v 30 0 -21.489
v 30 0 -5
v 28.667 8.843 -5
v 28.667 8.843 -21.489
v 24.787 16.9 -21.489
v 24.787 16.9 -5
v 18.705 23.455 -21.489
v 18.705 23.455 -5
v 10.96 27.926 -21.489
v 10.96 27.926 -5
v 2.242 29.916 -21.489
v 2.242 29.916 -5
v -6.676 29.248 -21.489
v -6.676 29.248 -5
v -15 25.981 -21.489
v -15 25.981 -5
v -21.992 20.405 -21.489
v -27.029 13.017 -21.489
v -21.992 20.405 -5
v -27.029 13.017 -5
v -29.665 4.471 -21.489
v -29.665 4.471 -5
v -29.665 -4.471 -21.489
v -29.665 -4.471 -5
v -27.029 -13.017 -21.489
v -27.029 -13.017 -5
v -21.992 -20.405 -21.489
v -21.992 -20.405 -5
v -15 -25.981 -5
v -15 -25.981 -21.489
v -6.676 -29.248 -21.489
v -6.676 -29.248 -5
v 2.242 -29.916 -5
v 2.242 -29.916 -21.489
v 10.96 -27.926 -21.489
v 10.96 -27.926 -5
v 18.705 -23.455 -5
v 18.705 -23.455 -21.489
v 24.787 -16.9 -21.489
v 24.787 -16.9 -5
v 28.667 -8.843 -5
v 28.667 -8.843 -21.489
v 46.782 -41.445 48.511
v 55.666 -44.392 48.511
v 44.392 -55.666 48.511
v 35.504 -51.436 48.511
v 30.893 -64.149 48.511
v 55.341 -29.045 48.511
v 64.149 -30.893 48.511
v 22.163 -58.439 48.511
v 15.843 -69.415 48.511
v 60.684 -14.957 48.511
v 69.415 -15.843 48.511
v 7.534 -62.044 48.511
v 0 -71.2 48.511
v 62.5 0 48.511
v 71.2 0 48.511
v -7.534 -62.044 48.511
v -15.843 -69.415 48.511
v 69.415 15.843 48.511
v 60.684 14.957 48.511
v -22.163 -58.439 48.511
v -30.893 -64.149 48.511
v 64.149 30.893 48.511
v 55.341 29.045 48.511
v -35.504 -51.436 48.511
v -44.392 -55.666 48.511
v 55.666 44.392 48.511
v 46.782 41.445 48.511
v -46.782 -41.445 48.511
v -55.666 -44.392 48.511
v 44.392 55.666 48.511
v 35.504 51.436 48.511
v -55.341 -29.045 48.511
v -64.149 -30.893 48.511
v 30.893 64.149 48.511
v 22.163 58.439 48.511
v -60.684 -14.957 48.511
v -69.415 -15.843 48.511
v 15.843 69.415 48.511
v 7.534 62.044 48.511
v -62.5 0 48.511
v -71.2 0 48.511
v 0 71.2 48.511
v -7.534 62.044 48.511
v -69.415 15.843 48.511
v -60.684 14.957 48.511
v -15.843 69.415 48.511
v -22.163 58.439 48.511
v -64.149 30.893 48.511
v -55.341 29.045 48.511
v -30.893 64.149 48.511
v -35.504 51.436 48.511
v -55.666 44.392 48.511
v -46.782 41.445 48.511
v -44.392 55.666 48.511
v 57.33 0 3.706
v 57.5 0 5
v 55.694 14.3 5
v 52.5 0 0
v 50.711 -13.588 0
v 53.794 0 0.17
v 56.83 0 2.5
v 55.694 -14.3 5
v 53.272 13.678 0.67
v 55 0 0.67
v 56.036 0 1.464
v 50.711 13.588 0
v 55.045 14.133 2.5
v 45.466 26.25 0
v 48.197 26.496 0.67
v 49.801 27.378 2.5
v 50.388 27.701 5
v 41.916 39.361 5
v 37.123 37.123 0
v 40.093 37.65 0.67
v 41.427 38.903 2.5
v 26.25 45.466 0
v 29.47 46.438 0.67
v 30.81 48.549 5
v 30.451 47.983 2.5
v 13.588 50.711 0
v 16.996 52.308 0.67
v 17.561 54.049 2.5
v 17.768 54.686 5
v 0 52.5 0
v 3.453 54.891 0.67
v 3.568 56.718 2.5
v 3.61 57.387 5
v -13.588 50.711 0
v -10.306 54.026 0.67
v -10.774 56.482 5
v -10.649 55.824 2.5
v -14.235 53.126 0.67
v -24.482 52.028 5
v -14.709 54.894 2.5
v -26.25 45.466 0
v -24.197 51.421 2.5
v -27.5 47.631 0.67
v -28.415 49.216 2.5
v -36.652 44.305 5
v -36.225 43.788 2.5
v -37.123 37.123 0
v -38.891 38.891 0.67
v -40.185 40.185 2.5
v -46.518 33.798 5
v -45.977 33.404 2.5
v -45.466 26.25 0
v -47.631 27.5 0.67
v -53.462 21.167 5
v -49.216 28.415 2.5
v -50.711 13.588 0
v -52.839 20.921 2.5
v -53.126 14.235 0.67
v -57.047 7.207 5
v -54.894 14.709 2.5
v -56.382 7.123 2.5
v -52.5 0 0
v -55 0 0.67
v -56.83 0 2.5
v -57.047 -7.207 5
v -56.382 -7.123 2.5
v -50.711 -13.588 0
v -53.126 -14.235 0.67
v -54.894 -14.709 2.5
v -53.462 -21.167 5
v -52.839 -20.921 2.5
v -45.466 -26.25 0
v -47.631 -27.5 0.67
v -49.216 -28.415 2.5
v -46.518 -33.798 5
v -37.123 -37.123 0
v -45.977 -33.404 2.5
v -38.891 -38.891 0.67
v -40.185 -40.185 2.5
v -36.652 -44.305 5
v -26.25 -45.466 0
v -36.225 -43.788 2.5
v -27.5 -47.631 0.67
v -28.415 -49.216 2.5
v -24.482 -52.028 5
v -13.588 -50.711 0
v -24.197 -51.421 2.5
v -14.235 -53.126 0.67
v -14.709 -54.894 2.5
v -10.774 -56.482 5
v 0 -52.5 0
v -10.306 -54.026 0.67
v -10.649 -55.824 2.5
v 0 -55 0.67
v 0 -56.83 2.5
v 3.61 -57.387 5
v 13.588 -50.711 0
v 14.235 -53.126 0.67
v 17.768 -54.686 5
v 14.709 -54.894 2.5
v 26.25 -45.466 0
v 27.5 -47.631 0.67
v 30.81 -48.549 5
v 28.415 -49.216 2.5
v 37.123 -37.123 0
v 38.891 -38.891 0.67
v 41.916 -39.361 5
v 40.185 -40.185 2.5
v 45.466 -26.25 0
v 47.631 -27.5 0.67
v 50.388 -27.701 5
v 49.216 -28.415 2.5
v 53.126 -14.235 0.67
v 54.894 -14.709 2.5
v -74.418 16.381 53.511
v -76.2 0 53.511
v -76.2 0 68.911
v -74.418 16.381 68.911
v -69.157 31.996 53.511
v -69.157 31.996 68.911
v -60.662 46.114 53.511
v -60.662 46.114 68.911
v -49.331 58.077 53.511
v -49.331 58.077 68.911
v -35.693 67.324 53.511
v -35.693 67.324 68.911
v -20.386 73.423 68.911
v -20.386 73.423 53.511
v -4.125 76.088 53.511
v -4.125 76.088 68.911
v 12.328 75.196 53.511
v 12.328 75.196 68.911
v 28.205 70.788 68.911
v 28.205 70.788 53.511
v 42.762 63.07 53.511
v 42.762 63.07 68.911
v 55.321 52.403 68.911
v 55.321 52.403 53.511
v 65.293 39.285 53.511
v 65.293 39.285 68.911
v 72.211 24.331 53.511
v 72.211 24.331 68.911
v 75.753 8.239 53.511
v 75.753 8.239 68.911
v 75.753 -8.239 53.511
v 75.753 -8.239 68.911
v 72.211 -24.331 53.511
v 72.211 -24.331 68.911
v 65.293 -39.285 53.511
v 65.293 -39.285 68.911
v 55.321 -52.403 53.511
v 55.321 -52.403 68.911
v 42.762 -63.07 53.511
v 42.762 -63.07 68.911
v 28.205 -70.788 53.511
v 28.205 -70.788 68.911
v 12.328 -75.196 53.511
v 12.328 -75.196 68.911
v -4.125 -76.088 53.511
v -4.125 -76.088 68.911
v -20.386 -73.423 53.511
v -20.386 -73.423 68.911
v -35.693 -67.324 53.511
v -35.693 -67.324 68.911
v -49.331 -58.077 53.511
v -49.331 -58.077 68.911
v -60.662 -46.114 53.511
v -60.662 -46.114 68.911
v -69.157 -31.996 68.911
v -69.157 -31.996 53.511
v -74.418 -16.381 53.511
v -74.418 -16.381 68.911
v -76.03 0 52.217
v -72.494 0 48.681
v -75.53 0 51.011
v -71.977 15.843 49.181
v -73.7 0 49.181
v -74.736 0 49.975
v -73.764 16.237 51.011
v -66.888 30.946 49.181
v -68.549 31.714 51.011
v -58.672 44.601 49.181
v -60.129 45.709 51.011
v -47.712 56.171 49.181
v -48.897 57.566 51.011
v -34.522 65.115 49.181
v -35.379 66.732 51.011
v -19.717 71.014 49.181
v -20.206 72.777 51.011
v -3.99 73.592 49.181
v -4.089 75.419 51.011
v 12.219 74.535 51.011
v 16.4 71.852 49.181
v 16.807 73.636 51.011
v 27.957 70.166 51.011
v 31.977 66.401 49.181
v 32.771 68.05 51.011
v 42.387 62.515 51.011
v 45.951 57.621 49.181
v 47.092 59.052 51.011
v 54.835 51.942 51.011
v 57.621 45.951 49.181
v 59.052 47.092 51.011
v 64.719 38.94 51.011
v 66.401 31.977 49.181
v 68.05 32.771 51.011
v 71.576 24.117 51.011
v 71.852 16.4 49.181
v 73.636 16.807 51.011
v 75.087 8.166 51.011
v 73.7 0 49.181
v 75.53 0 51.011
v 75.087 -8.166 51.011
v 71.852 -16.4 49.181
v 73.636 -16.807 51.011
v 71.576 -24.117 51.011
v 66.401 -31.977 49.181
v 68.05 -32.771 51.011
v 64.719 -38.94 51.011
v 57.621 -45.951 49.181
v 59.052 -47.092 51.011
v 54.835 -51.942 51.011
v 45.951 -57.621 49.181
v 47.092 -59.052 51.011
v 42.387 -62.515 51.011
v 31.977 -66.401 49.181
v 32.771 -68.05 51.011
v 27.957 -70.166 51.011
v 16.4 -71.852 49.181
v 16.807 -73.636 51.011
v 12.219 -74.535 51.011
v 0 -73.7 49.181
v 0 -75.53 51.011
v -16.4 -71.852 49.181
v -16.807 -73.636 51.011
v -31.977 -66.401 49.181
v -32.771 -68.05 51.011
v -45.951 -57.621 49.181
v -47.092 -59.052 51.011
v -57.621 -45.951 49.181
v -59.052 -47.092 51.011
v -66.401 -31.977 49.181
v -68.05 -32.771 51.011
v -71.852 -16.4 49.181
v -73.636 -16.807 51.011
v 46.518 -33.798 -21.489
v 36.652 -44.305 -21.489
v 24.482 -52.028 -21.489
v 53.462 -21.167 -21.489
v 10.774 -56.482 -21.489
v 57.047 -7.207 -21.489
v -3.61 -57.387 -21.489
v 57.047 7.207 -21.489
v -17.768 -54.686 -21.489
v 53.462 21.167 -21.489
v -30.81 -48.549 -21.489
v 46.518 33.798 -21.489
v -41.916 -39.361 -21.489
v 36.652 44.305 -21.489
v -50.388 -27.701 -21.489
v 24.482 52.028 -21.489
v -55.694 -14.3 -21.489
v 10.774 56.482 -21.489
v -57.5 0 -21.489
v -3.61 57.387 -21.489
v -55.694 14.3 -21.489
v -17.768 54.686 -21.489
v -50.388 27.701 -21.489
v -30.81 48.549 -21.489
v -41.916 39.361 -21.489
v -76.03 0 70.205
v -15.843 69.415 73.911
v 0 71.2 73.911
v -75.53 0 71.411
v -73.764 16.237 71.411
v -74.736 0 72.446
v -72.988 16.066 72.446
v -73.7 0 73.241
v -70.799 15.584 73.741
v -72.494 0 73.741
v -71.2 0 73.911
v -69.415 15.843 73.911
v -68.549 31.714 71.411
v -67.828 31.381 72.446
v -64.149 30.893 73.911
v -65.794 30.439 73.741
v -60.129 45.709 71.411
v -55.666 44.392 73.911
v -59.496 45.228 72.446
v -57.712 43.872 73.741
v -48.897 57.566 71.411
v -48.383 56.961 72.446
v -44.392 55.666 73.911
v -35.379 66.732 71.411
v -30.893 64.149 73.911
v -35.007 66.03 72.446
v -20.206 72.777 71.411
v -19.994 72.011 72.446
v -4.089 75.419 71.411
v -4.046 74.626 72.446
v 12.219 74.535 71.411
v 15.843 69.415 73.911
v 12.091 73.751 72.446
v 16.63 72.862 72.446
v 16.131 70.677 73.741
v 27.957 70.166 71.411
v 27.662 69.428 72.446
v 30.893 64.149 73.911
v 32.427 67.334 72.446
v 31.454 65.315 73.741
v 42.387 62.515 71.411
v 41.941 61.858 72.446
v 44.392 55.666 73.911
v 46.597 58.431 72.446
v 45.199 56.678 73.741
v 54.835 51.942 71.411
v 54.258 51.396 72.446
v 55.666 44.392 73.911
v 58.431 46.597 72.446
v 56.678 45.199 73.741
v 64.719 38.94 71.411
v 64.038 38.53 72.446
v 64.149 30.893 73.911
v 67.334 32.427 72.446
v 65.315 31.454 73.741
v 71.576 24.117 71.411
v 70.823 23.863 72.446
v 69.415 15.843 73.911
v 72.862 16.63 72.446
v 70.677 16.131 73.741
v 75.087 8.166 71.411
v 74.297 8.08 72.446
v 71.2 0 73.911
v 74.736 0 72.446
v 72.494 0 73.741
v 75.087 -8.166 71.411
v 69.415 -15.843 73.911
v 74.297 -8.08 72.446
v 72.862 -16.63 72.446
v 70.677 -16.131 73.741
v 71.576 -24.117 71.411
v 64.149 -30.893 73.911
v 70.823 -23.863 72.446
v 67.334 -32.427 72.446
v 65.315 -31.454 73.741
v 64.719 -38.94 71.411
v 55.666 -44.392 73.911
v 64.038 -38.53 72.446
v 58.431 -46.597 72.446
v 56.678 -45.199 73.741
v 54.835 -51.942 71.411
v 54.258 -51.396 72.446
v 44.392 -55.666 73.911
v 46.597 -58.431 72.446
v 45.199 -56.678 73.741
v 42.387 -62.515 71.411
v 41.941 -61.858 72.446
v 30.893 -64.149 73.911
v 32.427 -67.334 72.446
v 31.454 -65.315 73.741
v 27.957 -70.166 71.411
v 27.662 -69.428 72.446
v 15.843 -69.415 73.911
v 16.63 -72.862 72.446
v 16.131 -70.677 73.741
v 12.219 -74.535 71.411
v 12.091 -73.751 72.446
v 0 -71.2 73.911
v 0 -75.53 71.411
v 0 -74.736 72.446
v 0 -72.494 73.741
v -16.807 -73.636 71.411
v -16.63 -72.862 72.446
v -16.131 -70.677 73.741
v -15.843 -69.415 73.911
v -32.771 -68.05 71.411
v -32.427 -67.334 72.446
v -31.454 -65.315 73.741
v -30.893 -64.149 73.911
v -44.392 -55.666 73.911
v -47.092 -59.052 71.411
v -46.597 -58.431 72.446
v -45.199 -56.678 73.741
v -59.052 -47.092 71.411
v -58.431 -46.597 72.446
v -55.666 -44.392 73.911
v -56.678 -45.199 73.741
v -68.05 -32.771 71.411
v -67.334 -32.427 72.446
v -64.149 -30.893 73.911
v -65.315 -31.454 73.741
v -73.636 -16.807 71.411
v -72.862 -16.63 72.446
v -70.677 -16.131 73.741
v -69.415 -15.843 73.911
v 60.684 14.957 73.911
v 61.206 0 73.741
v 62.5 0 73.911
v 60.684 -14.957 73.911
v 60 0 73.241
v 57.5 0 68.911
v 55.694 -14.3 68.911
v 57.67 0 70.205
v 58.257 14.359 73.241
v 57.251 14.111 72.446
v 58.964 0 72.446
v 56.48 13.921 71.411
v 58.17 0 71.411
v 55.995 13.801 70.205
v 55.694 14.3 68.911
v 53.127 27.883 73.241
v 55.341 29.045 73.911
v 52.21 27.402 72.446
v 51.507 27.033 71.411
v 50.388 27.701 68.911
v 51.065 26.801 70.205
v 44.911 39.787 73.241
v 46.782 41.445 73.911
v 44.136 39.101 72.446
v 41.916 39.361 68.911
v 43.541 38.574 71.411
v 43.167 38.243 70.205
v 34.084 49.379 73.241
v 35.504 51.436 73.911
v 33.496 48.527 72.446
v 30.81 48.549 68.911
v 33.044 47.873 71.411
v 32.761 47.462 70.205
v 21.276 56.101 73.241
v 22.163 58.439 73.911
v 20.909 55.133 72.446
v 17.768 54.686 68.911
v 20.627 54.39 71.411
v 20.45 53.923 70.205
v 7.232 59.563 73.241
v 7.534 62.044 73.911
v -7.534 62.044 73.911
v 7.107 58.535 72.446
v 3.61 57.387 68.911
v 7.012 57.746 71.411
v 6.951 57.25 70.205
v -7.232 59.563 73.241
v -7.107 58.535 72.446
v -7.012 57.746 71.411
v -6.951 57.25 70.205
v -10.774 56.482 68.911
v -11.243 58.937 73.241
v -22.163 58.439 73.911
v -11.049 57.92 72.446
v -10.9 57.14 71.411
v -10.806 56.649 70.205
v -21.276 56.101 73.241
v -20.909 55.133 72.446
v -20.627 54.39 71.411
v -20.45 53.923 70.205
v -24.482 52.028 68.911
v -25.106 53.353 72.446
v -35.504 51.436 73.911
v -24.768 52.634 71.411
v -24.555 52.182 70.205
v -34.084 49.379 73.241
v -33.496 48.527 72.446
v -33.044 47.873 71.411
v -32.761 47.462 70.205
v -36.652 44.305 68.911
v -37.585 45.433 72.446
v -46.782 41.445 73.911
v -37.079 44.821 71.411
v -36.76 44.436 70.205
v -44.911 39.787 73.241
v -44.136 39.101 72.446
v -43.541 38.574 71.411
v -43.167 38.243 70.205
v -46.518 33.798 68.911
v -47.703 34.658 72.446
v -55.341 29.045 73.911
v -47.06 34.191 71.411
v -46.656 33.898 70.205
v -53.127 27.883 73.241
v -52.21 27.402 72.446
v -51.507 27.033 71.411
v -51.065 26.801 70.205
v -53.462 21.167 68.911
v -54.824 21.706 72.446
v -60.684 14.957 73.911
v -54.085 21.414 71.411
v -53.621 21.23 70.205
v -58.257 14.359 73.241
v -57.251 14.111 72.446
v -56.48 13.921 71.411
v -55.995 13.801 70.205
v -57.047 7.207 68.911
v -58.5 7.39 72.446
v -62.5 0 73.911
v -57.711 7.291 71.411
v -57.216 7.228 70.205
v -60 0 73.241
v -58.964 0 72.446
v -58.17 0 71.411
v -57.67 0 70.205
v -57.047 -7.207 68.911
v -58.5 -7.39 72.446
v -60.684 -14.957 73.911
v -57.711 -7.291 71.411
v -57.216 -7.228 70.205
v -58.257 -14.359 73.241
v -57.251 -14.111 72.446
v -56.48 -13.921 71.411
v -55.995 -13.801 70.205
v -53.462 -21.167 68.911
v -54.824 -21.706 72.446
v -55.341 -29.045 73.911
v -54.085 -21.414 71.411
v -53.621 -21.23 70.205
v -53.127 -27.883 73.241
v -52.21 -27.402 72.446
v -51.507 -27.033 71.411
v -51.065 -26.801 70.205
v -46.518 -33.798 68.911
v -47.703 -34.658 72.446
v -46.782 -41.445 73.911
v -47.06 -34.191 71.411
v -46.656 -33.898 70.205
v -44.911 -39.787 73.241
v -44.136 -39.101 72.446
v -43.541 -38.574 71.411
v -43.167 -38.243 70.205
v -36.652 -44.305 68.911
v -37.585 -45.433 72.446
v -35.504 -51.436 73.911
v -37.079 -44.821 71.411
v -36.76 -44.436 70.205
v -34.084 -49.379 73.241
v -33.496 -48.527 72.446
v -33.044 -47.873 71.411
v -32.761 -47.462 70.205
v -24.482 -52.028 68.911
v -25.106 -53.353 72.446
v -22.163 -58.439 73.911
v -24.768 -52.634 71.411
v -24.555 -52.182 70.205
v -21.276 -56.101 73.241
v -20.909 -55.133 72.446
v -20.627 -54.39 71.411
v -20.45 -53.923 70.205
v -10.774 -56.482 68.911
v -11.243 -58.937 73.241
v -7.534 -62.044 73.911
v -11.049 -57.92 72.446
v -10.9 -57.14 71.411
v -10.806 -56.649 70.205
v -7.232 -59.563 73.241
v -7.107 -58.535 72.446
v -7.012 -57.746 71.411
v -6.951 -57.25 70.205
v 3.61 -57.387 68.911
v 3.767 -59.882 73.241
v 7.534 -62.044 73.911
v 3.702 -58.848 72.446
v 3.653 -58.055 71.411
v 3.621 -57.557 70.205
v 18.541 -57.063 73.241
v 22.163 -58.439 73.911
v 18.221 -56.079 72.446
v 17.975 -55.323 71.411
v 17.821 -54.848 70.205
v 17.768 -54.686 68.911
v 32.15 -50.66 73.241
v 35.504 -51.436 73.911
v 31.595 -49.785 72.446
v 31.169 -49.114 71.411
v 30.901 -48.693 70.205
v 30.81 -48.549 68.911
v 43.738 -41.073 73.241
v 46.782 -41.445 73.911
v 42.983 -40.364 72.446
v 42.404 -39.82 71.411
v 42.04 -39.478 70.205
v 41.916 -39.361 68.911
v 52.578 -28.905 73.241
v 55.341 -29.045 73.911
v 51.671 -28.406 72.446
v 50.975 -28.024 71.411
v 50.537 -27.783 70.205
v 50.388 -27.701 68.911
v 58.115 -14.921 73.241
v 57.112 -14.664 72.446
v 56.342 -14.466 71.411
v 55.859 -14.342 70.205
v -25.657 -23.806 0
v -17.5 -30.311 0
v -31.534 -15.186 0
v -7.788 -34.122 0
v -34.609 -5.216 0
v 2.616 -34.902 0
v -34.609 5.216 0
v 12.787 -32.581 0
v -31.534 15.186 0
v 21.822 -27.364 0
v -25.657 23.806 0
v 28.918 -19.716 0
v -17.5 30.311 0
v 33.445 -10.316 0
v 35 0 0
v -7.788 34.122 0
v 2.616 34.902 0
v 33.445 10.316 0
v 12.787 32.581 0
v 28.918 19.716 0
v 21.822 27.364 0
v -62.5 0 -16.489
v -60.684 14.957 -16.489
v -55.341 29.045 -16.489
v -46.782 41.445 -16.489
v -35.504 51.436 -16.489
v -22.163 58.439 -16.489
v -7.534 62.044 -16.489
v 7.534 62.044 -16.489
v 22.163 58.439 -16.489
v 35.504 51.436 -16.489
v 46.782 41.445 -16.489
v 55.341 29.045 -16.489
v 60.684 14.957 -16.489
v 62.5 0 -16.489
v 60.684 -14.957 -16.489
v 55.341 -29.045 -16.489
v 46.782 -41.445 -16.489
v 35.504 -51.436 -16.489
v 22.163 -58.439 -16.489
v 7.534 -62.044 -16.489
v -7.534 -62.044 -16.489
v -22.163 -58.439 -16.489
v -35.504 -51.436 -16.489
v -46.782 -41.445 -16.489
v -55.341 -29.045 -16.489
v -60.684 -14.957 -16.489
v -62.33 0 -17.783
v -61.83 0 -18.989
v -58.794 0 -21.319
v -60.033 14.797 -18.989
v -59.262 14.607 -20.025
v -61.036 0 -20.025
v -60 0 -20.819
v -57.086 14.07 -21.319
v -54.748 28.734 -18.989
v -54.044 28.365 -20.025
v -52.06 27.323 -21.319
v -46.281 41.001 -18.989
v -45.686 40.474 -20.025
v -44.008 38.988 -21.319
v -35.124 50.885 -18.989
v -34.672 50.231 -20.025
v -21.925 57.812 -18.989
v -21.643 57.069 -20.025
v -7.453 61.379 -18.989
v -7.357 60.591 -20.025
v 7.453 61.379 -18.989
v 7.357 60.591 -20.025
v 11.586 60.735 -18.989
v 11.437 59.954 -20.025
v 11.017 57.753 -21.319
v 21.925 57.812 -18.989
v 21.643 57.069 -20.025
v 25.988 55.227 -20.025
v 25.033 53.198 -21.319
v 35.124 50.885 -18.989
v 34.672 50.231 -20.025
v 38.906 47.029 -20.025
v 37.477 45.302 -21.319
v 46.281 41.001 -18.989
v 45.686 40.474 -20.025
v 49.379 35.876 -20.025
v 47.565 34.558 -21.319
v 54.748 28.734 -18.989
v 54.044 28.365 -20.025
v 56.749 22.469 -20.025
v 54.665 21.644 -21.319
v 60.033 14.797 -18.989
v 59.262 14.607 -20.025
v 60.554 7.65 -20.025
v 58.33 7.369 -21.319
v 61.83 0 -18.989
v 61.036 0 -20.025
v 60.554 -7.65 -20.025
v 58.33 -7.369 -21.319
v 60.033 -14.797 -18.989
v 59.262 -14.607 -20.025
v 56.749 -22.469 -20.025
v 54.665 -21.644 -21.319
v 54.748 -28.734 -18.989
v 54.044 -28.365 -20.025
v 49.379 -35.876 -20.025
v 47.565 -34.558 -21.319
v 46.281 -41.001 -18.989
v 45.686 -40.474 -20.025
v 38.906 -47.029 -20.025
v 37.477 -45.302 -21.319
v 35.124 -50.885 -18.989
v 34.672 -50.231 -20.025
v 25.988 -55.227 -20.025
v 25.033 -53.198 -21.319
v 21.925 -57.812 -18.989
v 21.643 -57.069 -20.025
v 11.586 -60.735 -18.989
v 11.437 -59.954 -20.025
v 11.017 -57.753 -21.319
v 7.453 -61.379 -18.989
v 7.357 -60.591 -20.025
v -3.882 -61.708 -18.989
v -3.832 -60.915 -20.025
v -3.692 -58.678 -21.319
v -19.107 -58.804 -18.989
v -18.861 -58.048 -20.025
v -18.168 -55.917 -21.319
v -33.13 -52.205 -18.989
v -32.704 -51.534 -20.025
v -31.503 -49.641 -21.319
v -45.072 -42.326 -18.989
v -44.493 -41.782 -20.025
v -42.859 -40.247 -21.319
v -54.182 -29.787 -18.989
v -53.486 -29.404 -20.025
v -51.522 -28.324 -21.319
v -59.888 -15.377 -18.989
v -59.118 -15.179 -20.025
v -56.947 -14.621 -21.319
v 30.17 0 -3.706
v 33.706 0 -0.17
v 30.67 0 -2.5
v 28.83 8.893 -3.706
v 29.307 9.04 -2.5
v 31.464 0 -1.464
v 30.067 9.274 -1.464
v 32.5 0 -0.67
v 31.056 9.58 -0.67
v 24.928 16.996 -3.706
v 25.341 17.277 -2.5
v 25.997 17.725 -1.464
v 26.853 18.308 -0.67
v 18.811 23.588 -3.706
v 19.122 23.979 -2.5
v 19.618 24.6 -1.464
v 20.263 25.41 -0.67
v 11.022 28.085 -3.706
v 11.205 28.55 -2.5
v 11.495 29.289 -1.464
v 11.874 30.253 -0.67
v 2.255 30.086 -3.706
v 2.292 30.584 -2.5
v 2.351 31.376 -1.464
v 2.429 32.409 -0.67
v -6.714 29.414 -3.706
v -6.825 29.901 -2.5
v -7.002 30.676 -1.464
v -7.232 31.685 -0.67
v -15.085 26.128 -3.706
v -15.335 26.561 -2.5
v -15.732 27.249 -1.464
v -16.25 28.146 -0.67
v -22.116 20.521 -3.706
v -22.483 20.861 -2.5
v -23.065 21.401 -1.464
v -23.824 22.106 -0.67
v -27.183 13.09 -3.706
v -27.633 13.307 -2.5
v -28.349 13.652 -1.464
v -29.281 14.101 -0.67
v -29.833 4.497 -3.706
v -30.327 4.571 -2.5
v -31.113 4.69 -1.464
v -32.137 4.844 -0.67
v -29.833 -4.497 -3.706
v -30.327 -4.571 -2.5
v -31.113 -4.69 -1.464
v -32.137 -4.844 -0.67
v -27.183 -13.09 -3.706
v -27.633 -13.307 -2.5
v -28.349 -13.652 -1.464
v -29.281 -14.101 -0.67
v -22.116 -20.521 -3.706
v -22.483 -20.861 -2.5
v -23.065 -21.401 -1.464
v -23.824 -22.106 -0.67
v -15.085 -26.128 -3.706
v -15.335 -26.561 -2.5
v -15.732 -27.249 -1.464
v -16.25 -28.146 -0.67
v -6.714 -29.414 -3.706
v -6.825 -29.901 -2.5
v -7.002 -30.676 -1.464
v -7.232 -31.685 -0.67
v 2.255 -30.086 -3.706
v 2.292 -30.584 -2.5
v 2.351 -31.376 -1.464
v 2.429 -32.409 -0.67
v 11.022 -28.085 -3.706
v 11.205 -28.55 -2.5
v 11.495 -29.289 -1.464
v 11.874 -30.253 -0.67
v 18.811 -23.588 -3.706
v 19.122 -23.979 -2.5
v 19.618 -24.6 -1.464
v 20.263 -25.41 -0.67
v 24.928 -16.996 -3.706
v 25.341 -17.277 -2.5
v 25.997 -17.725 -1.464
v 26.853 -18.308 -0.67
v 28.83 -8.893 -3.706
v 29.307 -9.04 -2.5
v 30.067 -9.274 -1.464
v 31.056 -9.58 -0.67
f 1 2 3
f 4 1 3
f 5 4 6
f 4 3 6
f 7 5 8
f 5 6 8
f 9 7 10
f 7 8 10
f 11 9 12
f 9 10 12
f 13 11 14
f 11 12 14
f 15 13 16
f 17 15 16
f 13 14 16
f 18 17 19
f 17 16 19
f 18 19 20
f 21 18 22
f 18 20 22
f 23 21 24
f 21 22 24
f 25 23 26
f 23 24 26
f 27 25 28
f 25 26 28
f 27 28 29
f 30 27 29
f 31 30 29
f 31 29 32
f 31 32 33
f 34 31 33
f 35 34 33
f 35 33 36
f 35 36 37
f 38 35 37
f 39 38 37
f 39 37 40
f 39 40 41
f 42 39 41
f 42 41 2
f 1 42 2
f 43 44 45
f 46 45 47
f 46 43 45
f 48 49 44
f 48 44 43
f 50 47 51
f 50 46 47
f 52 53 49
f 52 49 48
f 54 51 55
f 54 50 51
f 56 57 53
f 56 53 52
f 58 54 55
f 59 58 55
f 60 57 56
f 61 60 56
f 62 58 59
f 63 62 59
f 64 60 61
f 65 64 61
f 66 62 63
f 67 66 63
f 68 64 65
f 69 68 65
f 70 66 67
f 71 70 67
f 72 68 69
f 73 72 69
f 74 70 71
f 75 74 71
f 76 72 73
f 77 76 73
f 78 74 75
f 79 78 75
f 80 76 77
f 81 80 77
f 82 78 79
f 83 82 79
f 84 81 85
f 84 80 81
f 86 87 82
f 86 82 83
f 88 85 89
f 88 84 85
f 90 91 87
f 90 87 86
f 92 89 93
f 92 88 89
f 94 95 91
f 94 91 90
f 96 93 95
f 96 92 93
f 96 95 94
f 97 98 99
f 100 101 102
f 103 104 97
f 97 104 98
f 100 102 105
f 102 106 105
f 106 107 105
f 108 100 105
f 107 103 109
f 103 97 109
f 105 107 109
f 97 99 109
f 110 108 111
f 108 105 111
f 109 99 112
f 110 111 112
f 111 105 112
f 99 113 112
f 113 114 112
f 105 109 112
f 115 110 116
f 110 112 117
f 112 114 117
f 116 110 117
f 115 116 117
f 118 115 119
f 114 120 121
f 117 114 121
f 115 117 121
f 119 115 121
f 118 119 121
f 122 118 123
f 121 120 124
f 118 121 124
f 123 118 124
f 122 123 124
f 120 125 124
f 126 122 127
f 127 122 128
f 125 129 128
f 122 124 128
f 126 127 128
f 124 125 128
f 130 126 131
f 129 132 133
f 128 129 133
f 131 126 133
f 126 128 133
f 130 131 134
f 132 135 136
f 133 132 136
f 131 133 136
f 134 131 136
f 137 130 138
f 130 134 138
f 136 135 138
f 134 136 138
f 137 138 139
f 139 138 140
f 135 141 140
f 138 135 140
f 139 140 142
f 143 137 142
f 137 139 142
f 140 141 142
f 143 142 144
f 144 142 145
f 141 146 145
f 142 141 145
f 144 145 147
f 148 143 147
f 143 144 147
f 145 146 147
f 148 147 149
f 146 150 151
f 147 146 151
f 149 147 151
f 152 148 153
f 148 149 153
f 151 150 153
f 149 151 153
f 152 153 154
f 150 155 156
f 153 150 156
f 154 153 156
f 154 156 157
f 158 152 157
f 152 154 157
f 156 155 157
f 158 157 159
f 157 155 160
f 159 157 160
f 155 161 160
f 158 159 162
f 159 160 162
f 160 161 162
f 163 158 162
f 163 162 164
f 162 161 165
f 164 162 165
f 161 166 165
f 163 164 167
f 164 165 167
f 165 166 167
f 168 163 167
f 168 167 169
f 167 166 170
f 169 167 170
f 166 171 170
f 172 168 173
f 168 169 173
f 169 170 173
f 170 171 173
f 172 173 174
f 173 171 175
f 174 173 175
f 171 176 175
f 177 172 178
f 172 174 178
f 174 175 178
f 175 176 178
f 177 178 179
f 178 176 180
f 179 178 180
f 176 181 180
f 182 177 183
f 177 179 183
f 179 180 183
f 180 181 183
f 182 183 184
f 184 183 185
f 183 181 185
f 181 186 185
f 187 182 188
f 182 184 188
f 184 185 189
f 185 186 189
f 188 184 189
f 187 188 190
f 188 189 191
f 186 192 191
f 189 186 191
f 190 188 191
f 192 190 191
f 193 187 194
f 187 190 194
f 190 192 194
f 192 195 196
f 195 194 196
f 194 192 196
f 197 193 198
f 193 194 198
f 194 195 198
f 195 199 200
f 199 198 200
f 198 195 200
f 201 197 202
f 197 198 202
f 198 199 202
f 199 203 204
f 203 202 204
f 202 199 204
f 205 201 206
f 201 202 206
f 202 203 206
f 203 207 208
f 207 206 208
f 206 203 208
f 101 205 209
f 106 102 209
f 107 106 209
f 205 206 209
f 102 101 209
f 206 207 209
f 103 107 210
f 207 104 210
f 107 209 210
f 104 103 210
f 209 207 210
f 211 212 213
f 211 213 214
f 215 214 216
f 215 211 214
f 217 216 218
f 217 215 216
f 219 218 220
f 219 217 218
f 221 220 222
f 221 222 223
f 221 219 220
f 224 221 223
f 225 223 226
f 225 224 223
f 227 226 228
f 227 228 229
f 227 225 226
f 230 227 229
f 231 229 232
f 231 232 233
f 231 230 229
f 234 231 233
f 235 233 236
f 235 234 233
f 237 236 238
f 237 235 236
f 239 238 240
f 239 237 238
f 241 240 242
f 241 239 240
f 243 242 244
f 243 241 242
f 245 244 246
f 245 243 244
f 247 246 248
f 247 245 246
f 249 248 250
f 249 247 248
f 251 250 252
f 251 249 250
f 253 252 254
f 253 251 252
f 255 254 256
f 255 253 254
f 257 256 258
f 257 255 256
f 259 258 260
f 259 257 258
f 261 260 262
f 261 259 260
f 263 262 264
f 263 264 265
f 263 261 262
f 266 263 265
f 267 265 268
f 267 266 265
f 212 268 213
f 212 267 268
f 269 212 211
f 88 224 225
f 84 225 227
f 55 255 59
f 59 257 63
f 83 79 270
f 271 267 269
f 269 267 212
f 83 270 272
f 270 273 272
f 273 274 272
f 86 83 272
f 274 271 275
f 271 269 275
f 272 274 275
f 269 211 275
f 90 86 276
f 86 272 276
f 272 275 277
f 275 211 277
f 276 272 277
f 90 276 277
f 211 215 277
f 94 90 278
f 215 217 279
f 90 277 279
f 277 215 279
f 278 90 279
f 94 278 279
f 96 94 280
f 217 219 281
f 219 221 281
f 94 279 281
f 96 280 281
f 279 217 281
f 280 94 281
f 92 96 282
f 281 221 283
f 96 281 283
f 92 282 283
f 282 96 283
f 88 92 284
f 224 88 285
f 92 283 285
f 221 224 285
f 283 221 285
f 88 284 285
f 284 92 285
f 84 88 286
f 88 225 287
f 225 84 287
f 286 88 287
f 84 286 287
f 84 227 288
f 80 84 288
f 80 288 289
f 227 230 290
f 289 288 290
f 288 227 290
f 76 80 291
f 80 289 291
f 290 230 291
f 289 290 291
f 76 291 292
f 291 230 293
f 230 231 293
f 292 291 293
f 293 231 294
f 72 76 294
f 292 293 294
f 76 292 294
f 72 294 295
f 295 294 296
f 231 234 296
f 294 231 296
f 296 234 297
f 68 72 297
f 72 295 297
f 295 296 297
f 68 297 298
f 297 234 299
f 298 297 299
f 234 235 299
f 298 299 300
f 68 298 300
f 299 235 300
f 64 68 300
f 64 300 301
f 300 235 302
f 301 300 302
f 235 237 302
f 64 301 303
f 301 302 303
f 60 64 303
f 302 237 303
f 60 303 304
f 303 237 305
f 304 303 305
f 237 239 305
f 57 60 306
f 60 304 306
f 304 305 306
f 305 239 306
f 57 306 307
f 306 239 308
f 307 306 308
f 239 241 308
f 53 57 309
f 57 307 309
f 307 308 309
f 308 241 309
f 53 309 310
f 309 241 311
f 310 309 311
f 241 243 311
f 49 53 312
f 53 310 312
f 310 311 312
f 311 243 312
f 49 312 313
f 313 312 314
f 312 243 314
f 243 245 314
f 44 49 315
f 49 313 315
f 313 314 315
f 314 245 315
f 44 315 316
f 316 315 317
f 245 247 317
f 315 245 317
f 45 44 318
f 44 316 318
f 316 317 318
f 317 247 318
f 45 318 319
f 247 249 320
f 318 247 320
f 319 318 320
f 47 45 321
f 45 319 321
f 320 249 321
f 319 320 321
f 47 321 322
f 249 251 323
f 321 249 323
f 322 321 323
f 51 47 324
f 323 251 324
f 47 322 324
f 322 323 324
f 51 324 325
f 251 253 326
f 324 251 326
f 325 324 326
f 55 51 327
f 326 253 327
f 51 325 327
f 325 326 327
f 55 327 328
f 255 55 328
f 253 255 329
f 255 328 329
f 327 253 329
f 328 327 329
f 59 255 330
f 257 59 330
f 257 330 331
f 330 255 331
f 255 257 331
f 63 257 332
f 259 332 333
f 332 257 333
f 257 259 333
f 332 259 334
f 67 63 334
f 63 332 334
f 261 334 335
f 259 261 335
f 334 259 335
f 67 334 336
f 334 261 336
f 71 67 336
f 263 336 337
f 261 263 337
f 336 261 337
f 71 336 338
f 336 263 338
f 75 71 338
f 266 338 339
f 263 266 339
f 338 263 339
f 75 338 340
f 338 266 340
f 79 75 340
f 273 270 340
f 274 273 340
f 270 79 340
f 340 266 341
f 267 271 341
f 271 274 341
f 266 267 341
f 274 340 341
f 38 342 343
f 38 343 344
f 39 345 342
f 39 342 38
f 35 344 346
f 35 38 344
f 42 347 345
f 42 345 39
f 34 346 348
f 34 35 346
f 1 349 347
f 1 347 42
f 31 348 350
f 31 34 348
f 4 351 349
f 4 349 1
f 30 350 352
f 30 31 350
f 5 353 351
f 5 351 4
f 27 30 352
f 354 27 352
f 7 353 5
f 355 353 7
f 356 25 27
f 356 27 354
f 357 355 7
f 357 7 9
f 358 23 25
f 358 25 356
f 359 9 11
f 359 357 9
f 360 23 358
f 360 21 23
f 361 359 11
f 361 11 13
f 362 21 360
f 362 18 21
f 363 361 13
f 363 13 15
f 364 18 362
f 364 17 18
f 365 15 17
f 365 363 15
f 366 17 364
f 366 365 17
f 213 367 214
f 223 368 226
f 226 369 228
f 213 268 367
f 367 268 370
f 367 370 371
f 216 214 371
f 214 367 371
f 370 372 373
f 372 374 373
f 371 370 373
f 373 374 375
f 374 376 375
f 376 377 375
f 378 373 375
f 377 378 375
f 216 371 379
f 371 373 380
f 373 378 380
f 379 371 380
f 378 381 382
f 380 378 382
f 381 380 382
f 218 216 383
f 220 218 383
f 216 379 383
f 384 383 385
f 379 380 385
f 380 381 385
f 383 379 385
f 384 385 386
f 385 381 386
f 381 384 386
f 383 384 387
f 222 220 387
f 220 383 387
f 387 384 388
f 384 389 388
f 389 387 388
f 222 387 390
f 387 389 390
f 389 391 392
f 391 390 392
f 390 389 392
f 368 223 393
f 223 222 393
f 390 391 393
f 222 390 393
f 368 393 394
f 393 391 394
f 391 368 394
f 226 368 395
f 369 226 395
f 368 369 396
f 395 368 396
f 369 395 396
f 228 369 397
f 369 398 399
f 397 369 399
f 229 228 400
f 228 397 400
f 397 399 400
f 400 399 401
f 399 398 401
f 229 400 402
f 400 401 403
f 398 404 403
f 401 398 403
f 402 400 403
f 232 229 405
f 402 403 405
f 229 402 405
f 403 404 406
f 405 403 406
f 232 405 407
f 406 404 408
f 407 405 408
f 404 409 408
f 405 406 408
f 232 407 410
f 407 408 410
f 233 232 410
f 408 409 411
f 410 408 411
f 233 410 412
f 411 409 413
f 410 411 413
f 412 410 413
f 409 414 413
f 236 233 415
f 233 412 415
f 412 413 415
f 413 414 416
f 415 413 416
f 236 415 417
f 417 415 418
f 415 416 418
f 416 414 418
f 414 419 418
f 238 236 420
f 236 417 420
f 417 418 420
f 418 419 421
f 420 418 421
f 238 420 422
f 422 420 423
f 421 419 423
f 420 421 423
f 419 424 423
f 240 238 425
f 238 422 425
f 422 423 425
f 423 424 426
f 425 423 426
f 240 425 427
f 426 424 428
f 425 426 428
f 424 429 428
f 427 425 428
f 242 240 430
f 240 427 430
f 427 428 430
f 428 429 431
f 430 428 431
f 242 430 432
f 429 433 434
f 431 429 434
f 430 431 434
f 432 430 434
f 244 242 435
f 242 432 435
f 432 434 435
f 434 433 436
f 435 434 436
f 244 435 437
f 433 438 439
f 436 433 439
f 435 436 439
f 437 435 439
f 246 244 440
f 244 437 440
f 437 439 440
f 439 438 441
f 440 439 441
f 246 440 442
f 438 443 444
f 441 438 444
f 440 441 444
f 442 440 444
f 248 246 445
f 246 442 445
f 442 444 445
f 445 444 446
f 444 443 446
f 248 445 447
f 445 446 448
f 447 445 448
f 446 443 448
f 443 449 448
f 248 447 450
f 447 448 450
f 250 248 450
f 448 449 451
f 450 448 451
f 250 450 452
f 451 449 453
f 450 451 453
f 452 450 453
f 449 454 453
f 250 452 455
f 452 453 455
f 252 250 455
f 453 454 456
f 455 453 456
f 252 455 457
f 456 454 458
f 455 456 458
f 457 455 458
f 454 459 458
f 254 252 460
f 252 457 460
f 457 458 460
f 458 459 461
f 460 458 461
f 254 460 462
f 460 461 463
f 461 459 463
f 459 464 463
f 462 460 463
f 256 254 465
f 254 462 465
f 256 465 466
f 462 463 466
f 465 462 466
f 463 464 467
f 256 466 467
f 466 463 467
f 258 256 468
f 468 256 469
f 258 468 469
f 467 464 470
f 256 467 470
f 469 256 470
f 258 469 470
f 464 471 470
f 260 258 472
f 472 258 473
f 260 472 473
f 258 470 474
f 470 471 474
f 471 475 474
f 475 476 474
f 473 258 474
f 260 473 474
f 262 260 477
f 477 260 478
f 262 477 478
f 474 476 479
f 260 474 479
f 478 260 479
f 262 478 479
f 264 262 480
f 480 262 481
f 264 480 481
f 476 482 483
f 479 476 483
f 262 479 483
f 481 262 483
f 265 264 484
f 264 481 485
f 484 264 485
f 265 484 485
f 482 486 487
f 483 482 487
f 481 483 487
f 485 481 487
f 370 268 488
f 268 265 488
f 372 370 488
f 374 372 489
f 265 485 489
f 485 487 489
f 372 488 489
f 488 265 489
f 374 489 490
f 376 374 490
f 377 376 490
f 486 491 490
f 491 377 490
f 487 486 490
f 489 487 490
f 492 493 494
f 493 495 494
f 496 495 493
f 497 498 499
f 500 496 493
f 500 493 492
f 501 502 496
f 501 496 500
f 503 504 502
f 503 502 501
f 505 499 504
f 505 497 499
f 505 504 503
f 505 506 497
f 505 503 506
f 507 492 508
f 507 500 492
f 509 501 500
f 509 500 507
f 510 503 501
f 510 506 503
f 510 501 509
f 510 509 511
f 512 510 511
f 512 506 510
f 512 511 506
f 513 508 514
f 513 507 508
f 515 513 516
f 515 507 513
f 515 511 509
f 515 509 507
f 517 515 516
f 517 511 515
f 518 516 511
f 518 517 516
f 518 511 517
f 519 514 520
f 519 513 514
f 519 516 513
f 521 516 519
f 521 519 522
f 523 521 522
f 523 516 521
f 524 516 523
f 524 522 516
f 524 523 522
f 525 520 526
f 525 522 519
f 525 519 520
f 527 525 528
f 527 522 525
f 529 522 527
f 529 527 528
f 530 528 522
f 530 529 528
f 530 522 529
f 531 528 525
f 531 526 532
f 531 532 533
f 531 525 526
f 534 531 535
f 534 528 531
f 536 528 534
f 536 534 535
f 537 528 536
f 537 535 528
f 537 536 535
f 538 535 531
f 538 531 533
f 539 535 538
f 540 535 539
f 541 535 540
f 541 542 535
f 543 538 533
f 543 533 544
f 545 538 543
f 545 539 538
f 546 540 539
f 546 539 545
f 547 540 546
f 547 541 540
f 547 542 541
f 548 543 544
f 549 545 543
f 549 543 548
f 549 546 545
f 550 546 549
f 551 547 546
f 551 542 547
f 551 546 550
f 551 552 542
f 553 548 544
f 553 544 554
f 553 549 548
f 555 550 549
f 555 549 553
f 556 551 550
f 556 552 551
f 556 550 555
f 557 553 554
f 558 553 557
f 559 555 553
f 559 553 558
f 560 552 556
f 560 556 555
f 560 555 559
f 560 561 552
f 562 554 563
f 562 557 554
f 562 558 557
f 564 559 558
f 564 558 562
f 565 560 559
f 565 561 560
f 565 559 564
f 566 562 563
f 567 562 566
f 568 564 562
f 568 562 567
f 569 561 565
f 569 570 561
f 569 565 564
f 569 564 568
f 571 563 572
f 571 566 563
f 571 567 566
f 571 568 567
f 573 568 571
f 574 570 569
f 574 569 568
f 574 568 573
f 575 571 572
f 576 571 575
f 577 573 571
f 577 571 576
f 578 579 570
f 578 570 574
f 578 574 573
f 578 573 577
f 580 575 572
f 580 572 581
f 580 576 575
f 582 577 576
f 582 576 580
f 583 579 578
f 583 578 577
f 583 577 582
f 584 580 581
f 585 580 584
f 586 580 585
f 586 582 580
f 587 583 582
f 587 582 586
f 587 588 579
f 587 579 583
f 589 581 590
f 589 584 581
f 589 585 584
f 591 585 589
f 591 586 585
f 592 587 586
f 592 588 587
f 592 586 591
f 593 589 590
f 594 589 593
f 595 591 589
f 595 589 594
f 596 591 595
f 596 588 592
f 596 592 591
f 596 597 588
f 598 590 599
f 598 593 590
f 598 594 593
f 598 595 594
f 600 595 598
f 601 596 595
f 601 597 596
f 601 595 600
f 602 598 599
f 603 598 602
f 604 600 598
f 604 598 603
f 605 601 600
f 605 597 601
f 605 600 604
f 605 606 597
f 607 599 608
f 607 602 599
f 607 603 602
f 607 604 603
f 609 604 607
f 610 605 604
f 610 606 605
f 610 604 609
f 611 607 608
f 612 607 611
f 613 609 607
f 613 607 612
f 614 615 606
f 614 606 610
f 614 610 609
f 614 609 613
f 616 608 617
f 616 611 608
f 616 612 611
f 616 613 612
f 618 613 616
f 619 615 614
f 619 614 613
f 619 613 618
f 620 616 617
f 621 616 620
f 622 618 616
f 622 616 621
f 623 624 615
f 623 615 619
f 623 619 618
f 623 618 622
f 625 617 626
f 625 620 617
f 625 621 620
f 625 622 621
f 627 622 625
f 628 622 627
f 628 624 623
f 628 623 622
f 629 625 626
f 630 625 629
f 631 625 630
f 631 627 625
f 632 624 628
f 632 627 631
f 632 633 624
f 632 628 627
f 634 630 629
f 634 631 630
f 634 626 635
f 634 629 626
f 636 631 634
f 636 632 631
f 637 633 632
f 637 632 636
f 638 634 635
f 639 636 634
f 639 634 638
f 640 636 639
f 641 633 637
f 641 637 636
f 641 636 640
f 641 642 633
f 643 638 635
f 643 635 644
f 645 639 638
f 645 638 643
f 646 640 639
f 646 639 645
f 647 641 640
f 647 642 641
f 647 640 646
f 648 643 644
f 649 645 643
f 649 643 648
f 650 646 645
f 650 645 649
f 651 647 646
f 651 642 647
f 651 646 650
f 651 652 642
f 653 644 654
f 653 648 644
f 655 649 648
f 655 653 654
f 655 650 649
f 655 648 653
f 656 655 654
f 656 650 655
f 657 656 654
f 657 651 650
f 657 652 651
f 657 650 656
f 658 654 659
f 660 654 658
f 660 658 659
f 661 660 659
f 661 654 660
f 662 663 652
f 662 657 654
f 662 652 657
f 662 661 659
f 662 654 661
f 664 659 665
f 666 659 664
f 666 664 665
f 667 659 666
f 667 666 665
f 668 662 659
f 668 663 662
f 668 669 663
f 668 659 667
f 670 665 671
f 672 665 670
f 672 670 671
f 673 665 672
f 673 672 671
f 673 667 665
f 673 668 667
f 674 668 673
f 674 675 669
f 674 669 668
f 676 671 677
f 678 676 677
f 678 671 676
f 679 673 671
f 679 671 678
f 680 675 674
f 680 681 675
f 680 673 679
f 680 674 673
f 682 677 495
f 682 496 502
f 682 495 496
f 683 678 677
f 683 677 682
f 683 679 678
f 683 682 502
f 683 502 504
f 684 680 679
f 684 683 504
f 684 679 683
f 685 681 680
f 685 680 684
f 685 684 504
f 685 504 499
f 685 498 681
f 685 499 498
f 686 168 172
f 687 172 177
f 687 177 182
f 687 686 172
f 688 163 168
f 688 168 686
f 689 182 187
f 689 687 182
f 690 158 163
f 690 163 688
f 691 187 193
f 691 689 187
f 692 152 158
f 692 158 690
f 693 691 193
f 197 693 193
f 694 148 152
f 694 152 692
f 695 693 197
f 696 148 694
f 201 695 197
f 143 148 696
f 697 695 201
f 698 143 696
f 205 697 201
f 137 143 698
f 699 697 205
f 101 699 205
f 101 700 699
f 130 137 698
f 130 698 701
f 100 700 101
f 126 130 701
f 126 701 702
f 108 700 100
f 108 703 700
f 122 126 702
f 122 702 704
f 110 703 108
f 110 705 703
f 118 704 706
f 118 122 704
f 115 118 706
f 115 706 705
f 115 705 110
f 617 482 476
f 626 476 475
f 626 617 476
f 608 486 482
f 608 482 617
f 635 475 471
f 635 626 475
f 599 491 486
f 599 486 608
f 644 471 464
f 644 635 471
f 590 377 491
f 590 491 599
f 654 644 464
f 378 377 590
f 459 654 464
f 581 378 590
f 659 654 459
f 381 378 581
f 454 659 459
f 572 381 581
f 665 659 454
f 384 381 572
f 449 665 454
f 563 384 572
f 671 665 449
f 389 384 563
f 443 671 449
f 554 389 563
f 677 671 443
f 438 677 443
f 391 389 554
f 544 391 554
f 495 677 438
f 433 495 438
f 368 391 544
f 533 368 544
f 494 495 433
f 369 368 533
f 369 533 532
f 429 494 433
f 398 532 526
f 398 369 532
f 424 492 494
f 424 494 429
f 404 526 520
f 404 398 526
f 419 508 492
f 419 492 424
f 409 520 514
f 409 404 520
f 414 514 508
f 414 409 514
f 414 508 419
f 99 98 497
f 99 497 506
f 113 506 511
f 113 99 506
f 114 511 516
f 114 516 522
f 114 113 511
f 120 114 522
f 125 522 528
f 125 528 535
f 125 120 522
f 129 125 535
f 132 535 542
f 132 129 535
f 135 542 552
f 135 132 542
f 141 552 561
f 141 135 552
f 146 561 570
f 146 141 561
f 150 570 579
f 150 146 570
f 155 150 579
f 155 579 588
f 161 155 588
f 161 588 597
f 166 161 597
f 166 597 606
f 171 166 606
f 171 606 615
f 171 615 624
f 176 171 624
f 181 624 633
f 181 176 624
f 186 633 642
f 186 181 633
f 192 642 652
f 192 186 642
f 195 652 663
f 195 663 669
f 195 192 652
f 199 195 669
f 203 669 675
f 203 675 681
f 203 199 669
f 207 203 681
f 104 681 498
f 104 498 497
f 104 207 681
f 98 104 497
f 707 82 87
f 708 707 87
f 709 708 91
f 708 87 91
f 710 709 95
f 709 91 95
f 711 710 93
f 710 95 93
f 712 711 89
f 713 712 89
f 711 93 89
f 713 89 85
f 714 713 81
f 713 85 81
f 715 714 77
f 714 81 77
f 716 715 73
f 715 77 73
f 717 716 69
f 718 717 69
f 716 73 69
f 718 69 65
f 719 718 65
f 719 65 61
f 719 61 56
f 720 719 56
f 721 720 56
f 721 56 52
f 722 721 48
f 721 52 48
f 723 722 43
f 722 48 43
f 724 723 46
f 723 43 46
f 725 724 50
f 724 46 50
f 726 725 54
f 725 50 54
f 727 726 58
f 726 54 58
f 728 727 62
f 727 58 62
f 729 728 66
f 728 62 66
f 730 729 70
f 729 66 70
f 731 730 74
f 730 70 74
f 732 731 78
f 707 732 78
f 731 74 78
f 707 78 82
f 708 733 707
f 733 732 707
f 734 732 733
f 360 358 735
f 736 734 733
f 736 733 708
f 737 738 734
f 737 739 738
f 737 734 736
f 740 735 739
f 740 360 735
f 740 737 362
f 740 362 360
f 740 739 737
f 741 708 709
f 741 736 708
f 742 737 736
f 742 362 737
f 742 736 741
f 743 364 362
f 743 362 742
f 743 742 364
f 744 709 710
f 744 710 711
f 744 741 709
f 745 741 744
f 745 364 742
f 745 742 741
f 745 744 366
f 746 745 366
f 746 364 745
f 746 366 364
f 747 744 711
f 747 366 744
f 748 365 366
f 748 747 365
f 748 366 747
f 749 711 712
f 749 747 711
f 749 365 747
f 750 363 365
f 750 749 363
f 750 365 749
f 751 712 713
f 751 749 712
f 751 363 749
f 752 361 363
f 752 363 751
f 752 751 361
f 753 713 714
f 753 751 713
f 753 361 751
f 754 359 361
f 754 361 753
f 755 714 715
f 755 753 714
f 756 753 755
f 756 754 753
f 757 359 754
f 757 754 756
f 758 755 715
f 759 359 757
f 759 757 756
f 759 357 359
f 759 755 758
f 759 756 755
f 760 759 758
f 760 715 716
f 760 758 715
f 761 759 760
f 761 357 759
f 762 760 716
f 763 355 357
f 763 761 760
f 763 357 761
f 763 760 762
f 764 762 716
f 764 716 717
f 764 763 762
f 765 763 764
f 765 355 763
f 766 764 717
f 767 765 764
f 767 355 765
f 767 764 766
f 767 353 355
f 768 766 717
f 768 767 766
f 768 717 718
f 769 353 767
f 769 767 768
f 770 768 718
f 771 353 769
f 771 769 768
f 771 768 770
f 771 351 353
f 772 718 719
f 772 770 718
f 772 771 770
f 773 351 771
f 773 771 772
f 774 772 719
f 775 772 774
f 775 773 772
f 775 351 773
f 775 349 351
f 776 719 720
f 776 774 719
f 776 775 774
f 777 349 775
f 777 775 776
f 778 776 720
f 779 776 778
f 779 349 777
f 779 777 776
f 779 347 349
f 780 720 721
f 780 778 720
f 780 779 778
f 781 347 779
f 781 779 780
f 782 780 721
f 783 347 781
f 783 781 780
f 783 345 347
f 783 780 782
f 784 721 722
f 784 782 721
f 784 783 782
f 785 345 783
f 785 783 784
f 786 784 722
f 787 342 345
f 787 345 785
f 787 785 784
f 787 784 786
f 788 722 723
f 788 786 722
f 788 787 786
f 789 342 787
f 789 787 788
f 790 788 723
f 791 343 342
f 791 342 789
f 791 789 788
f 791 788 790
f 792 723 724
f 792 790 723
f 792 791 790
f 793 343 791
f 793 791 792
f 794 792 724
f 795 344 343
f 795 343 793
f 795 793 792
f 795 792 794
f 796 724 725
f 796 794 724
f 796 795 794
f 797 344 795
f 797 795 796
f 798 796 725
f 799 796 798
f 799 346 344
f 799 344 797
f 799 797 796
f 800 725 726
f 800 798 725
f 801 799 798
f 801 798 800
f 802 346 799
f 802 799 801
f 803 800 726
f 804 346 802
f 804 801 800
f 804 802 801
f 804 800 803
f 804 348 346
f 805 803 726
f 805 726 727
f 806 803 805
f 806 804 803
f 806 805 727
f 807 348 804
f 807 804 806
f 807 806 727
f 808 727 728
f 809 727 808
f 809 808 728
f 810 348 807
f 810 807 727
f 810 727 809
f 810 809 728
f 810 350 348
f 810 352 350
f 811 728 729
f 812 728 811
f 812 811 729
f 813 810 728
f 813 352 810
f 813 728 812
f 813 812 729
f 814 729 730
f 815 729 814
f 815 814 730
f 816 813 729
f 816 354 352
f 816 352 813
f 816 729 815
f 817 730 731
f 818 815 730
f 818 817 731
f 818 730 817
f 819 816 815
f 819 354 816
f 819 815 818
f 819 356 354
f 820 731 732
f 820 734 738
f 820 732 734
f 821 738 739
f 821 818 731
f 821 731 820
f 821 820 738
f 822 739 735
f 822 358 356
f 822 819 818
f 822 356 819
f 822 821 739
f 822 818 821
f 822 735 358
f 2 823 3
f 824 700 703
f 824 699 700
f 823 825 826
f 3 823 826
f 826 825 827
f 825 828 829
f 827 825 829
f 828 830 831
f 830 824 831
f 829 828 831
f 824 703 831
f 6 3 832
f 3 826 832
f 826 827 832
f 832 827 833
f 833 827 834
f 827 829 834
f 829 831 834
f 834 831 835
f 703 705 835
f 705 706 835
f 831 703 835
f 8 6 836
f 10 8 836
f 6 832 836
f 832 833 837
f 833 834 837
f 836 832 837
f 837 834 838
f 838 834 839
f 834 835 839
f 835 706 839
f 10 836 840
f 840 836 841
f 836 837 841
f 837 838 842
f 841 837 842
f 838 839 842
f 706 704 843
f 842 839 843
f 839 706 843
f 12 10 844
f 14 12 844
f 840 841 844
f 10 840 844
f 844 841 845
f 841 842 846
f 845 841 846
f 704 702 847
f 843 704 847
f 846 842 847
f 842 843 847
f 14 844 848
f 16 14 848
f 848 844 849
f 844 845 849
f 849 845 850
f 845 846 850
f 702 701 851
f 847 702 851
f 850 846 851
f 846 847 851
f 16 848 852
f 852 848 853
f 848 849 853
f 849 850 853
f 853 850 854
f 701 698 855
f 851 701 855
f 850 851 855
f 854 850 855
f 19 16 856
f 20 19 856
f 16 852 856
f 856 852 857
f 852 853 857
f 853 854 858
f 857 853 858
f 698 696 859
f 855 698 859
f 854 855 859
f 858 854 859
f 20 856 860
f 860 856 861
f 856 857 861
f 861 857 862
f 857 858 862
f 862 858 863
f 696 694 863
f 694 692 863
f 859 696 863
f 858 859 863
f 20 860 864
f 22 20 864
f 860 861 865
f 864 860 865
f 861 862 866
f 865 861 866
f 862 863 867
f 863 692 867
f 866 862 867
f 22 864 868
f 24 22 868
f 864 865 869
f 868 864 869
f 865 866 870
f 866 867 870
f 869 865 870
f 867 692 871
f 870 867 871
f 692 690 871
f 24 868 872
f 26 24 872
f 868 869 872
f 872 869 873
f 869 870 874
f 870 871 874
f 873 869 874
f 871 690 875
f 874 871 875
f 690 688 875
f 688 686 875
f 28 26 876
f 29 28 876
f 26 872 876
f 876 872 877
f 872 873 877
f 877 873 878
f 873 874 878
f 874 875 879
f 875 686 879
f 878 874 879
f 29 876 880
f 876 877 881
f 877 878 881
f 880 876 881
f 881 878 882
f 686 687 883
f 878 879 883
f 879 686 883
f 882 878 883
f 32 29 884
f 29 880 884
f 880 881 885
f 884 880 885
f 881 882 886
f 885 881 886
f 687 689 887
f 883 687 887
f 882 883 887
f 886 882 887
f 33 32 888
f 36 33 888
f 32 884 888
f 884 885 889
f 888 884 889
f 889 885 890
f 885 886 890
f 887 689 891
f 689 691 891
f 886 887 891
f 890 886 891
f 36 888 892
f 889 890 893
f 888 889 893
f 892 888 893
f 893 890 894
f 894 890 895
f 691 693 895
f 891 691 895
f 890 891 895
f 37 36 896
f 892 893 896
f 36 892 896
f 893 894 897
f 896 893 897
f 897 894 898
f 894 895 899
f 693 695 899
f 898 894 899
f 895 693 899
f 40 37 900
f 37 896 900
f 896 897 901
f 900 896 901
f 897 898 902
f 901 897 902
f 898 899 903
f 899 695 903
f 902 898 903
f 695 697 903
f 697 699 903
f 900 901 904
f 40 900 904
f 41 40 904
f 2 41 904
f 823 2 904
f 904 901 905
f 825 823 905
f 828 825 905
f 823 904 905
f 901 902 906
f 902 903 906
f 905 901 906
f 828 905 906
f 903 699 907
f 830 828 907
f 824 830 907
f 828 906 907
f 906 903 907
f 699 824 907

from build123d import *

# Parameters (mm, degrees)
F0_W     = 62.5
F0_H     = 70
F1_R     = 57.5
F3_DEPTH = 73.910910777
F4_R     = 30
F5_DEPTH = 21.490089223
F6_R     = 5


with BuildPart() as f2:
    # F0 (on Front) → F2 (revolve)
    with BuildSketch(Plane.XZ):
        with Locations((-31.25, 13.510910777)):
            Rectangle(F0_W, F0_H)
        Polygon((-62.5, 48.510910777), (0, 48.510910777), (0, 73.910910777), (-76.2, 73.910910777), (-76.2, 48.510910777), align=None)
    revolve(axis=Axis((0, 0, 61.210910777), (0, 0, -1)))

    # F1 (on Top) → F3 (cut, through all)
    with BuildSketch(Plane.XY):
        Circle(F1_R)
    extrude(amount=F3_DEPTH, mode=Mode.SUBTRACT)

    # F4 (on Top) → F5 (cut, through all)
    with BuildSketch(Plane.XY):
        Circle(F4_R)
    extrude(amount=-F5_DEPTH, mode=Mode.SUBTRACT)

    # F6
    f6_edges = [f2.edges().sort_by_distance(p)[0] for p in [
        (-57.5, 0, 73.910911),
        (76.2, 0, 73.910911),
        (76.2, 0, 48.510911),
        (62.5, 0, -21.489089),
        (-30, 0, 0),
        (-57.5, 0, 0),
    ]]
    fillet(f6_edges, radius=F6_R)


solid = f2.part
